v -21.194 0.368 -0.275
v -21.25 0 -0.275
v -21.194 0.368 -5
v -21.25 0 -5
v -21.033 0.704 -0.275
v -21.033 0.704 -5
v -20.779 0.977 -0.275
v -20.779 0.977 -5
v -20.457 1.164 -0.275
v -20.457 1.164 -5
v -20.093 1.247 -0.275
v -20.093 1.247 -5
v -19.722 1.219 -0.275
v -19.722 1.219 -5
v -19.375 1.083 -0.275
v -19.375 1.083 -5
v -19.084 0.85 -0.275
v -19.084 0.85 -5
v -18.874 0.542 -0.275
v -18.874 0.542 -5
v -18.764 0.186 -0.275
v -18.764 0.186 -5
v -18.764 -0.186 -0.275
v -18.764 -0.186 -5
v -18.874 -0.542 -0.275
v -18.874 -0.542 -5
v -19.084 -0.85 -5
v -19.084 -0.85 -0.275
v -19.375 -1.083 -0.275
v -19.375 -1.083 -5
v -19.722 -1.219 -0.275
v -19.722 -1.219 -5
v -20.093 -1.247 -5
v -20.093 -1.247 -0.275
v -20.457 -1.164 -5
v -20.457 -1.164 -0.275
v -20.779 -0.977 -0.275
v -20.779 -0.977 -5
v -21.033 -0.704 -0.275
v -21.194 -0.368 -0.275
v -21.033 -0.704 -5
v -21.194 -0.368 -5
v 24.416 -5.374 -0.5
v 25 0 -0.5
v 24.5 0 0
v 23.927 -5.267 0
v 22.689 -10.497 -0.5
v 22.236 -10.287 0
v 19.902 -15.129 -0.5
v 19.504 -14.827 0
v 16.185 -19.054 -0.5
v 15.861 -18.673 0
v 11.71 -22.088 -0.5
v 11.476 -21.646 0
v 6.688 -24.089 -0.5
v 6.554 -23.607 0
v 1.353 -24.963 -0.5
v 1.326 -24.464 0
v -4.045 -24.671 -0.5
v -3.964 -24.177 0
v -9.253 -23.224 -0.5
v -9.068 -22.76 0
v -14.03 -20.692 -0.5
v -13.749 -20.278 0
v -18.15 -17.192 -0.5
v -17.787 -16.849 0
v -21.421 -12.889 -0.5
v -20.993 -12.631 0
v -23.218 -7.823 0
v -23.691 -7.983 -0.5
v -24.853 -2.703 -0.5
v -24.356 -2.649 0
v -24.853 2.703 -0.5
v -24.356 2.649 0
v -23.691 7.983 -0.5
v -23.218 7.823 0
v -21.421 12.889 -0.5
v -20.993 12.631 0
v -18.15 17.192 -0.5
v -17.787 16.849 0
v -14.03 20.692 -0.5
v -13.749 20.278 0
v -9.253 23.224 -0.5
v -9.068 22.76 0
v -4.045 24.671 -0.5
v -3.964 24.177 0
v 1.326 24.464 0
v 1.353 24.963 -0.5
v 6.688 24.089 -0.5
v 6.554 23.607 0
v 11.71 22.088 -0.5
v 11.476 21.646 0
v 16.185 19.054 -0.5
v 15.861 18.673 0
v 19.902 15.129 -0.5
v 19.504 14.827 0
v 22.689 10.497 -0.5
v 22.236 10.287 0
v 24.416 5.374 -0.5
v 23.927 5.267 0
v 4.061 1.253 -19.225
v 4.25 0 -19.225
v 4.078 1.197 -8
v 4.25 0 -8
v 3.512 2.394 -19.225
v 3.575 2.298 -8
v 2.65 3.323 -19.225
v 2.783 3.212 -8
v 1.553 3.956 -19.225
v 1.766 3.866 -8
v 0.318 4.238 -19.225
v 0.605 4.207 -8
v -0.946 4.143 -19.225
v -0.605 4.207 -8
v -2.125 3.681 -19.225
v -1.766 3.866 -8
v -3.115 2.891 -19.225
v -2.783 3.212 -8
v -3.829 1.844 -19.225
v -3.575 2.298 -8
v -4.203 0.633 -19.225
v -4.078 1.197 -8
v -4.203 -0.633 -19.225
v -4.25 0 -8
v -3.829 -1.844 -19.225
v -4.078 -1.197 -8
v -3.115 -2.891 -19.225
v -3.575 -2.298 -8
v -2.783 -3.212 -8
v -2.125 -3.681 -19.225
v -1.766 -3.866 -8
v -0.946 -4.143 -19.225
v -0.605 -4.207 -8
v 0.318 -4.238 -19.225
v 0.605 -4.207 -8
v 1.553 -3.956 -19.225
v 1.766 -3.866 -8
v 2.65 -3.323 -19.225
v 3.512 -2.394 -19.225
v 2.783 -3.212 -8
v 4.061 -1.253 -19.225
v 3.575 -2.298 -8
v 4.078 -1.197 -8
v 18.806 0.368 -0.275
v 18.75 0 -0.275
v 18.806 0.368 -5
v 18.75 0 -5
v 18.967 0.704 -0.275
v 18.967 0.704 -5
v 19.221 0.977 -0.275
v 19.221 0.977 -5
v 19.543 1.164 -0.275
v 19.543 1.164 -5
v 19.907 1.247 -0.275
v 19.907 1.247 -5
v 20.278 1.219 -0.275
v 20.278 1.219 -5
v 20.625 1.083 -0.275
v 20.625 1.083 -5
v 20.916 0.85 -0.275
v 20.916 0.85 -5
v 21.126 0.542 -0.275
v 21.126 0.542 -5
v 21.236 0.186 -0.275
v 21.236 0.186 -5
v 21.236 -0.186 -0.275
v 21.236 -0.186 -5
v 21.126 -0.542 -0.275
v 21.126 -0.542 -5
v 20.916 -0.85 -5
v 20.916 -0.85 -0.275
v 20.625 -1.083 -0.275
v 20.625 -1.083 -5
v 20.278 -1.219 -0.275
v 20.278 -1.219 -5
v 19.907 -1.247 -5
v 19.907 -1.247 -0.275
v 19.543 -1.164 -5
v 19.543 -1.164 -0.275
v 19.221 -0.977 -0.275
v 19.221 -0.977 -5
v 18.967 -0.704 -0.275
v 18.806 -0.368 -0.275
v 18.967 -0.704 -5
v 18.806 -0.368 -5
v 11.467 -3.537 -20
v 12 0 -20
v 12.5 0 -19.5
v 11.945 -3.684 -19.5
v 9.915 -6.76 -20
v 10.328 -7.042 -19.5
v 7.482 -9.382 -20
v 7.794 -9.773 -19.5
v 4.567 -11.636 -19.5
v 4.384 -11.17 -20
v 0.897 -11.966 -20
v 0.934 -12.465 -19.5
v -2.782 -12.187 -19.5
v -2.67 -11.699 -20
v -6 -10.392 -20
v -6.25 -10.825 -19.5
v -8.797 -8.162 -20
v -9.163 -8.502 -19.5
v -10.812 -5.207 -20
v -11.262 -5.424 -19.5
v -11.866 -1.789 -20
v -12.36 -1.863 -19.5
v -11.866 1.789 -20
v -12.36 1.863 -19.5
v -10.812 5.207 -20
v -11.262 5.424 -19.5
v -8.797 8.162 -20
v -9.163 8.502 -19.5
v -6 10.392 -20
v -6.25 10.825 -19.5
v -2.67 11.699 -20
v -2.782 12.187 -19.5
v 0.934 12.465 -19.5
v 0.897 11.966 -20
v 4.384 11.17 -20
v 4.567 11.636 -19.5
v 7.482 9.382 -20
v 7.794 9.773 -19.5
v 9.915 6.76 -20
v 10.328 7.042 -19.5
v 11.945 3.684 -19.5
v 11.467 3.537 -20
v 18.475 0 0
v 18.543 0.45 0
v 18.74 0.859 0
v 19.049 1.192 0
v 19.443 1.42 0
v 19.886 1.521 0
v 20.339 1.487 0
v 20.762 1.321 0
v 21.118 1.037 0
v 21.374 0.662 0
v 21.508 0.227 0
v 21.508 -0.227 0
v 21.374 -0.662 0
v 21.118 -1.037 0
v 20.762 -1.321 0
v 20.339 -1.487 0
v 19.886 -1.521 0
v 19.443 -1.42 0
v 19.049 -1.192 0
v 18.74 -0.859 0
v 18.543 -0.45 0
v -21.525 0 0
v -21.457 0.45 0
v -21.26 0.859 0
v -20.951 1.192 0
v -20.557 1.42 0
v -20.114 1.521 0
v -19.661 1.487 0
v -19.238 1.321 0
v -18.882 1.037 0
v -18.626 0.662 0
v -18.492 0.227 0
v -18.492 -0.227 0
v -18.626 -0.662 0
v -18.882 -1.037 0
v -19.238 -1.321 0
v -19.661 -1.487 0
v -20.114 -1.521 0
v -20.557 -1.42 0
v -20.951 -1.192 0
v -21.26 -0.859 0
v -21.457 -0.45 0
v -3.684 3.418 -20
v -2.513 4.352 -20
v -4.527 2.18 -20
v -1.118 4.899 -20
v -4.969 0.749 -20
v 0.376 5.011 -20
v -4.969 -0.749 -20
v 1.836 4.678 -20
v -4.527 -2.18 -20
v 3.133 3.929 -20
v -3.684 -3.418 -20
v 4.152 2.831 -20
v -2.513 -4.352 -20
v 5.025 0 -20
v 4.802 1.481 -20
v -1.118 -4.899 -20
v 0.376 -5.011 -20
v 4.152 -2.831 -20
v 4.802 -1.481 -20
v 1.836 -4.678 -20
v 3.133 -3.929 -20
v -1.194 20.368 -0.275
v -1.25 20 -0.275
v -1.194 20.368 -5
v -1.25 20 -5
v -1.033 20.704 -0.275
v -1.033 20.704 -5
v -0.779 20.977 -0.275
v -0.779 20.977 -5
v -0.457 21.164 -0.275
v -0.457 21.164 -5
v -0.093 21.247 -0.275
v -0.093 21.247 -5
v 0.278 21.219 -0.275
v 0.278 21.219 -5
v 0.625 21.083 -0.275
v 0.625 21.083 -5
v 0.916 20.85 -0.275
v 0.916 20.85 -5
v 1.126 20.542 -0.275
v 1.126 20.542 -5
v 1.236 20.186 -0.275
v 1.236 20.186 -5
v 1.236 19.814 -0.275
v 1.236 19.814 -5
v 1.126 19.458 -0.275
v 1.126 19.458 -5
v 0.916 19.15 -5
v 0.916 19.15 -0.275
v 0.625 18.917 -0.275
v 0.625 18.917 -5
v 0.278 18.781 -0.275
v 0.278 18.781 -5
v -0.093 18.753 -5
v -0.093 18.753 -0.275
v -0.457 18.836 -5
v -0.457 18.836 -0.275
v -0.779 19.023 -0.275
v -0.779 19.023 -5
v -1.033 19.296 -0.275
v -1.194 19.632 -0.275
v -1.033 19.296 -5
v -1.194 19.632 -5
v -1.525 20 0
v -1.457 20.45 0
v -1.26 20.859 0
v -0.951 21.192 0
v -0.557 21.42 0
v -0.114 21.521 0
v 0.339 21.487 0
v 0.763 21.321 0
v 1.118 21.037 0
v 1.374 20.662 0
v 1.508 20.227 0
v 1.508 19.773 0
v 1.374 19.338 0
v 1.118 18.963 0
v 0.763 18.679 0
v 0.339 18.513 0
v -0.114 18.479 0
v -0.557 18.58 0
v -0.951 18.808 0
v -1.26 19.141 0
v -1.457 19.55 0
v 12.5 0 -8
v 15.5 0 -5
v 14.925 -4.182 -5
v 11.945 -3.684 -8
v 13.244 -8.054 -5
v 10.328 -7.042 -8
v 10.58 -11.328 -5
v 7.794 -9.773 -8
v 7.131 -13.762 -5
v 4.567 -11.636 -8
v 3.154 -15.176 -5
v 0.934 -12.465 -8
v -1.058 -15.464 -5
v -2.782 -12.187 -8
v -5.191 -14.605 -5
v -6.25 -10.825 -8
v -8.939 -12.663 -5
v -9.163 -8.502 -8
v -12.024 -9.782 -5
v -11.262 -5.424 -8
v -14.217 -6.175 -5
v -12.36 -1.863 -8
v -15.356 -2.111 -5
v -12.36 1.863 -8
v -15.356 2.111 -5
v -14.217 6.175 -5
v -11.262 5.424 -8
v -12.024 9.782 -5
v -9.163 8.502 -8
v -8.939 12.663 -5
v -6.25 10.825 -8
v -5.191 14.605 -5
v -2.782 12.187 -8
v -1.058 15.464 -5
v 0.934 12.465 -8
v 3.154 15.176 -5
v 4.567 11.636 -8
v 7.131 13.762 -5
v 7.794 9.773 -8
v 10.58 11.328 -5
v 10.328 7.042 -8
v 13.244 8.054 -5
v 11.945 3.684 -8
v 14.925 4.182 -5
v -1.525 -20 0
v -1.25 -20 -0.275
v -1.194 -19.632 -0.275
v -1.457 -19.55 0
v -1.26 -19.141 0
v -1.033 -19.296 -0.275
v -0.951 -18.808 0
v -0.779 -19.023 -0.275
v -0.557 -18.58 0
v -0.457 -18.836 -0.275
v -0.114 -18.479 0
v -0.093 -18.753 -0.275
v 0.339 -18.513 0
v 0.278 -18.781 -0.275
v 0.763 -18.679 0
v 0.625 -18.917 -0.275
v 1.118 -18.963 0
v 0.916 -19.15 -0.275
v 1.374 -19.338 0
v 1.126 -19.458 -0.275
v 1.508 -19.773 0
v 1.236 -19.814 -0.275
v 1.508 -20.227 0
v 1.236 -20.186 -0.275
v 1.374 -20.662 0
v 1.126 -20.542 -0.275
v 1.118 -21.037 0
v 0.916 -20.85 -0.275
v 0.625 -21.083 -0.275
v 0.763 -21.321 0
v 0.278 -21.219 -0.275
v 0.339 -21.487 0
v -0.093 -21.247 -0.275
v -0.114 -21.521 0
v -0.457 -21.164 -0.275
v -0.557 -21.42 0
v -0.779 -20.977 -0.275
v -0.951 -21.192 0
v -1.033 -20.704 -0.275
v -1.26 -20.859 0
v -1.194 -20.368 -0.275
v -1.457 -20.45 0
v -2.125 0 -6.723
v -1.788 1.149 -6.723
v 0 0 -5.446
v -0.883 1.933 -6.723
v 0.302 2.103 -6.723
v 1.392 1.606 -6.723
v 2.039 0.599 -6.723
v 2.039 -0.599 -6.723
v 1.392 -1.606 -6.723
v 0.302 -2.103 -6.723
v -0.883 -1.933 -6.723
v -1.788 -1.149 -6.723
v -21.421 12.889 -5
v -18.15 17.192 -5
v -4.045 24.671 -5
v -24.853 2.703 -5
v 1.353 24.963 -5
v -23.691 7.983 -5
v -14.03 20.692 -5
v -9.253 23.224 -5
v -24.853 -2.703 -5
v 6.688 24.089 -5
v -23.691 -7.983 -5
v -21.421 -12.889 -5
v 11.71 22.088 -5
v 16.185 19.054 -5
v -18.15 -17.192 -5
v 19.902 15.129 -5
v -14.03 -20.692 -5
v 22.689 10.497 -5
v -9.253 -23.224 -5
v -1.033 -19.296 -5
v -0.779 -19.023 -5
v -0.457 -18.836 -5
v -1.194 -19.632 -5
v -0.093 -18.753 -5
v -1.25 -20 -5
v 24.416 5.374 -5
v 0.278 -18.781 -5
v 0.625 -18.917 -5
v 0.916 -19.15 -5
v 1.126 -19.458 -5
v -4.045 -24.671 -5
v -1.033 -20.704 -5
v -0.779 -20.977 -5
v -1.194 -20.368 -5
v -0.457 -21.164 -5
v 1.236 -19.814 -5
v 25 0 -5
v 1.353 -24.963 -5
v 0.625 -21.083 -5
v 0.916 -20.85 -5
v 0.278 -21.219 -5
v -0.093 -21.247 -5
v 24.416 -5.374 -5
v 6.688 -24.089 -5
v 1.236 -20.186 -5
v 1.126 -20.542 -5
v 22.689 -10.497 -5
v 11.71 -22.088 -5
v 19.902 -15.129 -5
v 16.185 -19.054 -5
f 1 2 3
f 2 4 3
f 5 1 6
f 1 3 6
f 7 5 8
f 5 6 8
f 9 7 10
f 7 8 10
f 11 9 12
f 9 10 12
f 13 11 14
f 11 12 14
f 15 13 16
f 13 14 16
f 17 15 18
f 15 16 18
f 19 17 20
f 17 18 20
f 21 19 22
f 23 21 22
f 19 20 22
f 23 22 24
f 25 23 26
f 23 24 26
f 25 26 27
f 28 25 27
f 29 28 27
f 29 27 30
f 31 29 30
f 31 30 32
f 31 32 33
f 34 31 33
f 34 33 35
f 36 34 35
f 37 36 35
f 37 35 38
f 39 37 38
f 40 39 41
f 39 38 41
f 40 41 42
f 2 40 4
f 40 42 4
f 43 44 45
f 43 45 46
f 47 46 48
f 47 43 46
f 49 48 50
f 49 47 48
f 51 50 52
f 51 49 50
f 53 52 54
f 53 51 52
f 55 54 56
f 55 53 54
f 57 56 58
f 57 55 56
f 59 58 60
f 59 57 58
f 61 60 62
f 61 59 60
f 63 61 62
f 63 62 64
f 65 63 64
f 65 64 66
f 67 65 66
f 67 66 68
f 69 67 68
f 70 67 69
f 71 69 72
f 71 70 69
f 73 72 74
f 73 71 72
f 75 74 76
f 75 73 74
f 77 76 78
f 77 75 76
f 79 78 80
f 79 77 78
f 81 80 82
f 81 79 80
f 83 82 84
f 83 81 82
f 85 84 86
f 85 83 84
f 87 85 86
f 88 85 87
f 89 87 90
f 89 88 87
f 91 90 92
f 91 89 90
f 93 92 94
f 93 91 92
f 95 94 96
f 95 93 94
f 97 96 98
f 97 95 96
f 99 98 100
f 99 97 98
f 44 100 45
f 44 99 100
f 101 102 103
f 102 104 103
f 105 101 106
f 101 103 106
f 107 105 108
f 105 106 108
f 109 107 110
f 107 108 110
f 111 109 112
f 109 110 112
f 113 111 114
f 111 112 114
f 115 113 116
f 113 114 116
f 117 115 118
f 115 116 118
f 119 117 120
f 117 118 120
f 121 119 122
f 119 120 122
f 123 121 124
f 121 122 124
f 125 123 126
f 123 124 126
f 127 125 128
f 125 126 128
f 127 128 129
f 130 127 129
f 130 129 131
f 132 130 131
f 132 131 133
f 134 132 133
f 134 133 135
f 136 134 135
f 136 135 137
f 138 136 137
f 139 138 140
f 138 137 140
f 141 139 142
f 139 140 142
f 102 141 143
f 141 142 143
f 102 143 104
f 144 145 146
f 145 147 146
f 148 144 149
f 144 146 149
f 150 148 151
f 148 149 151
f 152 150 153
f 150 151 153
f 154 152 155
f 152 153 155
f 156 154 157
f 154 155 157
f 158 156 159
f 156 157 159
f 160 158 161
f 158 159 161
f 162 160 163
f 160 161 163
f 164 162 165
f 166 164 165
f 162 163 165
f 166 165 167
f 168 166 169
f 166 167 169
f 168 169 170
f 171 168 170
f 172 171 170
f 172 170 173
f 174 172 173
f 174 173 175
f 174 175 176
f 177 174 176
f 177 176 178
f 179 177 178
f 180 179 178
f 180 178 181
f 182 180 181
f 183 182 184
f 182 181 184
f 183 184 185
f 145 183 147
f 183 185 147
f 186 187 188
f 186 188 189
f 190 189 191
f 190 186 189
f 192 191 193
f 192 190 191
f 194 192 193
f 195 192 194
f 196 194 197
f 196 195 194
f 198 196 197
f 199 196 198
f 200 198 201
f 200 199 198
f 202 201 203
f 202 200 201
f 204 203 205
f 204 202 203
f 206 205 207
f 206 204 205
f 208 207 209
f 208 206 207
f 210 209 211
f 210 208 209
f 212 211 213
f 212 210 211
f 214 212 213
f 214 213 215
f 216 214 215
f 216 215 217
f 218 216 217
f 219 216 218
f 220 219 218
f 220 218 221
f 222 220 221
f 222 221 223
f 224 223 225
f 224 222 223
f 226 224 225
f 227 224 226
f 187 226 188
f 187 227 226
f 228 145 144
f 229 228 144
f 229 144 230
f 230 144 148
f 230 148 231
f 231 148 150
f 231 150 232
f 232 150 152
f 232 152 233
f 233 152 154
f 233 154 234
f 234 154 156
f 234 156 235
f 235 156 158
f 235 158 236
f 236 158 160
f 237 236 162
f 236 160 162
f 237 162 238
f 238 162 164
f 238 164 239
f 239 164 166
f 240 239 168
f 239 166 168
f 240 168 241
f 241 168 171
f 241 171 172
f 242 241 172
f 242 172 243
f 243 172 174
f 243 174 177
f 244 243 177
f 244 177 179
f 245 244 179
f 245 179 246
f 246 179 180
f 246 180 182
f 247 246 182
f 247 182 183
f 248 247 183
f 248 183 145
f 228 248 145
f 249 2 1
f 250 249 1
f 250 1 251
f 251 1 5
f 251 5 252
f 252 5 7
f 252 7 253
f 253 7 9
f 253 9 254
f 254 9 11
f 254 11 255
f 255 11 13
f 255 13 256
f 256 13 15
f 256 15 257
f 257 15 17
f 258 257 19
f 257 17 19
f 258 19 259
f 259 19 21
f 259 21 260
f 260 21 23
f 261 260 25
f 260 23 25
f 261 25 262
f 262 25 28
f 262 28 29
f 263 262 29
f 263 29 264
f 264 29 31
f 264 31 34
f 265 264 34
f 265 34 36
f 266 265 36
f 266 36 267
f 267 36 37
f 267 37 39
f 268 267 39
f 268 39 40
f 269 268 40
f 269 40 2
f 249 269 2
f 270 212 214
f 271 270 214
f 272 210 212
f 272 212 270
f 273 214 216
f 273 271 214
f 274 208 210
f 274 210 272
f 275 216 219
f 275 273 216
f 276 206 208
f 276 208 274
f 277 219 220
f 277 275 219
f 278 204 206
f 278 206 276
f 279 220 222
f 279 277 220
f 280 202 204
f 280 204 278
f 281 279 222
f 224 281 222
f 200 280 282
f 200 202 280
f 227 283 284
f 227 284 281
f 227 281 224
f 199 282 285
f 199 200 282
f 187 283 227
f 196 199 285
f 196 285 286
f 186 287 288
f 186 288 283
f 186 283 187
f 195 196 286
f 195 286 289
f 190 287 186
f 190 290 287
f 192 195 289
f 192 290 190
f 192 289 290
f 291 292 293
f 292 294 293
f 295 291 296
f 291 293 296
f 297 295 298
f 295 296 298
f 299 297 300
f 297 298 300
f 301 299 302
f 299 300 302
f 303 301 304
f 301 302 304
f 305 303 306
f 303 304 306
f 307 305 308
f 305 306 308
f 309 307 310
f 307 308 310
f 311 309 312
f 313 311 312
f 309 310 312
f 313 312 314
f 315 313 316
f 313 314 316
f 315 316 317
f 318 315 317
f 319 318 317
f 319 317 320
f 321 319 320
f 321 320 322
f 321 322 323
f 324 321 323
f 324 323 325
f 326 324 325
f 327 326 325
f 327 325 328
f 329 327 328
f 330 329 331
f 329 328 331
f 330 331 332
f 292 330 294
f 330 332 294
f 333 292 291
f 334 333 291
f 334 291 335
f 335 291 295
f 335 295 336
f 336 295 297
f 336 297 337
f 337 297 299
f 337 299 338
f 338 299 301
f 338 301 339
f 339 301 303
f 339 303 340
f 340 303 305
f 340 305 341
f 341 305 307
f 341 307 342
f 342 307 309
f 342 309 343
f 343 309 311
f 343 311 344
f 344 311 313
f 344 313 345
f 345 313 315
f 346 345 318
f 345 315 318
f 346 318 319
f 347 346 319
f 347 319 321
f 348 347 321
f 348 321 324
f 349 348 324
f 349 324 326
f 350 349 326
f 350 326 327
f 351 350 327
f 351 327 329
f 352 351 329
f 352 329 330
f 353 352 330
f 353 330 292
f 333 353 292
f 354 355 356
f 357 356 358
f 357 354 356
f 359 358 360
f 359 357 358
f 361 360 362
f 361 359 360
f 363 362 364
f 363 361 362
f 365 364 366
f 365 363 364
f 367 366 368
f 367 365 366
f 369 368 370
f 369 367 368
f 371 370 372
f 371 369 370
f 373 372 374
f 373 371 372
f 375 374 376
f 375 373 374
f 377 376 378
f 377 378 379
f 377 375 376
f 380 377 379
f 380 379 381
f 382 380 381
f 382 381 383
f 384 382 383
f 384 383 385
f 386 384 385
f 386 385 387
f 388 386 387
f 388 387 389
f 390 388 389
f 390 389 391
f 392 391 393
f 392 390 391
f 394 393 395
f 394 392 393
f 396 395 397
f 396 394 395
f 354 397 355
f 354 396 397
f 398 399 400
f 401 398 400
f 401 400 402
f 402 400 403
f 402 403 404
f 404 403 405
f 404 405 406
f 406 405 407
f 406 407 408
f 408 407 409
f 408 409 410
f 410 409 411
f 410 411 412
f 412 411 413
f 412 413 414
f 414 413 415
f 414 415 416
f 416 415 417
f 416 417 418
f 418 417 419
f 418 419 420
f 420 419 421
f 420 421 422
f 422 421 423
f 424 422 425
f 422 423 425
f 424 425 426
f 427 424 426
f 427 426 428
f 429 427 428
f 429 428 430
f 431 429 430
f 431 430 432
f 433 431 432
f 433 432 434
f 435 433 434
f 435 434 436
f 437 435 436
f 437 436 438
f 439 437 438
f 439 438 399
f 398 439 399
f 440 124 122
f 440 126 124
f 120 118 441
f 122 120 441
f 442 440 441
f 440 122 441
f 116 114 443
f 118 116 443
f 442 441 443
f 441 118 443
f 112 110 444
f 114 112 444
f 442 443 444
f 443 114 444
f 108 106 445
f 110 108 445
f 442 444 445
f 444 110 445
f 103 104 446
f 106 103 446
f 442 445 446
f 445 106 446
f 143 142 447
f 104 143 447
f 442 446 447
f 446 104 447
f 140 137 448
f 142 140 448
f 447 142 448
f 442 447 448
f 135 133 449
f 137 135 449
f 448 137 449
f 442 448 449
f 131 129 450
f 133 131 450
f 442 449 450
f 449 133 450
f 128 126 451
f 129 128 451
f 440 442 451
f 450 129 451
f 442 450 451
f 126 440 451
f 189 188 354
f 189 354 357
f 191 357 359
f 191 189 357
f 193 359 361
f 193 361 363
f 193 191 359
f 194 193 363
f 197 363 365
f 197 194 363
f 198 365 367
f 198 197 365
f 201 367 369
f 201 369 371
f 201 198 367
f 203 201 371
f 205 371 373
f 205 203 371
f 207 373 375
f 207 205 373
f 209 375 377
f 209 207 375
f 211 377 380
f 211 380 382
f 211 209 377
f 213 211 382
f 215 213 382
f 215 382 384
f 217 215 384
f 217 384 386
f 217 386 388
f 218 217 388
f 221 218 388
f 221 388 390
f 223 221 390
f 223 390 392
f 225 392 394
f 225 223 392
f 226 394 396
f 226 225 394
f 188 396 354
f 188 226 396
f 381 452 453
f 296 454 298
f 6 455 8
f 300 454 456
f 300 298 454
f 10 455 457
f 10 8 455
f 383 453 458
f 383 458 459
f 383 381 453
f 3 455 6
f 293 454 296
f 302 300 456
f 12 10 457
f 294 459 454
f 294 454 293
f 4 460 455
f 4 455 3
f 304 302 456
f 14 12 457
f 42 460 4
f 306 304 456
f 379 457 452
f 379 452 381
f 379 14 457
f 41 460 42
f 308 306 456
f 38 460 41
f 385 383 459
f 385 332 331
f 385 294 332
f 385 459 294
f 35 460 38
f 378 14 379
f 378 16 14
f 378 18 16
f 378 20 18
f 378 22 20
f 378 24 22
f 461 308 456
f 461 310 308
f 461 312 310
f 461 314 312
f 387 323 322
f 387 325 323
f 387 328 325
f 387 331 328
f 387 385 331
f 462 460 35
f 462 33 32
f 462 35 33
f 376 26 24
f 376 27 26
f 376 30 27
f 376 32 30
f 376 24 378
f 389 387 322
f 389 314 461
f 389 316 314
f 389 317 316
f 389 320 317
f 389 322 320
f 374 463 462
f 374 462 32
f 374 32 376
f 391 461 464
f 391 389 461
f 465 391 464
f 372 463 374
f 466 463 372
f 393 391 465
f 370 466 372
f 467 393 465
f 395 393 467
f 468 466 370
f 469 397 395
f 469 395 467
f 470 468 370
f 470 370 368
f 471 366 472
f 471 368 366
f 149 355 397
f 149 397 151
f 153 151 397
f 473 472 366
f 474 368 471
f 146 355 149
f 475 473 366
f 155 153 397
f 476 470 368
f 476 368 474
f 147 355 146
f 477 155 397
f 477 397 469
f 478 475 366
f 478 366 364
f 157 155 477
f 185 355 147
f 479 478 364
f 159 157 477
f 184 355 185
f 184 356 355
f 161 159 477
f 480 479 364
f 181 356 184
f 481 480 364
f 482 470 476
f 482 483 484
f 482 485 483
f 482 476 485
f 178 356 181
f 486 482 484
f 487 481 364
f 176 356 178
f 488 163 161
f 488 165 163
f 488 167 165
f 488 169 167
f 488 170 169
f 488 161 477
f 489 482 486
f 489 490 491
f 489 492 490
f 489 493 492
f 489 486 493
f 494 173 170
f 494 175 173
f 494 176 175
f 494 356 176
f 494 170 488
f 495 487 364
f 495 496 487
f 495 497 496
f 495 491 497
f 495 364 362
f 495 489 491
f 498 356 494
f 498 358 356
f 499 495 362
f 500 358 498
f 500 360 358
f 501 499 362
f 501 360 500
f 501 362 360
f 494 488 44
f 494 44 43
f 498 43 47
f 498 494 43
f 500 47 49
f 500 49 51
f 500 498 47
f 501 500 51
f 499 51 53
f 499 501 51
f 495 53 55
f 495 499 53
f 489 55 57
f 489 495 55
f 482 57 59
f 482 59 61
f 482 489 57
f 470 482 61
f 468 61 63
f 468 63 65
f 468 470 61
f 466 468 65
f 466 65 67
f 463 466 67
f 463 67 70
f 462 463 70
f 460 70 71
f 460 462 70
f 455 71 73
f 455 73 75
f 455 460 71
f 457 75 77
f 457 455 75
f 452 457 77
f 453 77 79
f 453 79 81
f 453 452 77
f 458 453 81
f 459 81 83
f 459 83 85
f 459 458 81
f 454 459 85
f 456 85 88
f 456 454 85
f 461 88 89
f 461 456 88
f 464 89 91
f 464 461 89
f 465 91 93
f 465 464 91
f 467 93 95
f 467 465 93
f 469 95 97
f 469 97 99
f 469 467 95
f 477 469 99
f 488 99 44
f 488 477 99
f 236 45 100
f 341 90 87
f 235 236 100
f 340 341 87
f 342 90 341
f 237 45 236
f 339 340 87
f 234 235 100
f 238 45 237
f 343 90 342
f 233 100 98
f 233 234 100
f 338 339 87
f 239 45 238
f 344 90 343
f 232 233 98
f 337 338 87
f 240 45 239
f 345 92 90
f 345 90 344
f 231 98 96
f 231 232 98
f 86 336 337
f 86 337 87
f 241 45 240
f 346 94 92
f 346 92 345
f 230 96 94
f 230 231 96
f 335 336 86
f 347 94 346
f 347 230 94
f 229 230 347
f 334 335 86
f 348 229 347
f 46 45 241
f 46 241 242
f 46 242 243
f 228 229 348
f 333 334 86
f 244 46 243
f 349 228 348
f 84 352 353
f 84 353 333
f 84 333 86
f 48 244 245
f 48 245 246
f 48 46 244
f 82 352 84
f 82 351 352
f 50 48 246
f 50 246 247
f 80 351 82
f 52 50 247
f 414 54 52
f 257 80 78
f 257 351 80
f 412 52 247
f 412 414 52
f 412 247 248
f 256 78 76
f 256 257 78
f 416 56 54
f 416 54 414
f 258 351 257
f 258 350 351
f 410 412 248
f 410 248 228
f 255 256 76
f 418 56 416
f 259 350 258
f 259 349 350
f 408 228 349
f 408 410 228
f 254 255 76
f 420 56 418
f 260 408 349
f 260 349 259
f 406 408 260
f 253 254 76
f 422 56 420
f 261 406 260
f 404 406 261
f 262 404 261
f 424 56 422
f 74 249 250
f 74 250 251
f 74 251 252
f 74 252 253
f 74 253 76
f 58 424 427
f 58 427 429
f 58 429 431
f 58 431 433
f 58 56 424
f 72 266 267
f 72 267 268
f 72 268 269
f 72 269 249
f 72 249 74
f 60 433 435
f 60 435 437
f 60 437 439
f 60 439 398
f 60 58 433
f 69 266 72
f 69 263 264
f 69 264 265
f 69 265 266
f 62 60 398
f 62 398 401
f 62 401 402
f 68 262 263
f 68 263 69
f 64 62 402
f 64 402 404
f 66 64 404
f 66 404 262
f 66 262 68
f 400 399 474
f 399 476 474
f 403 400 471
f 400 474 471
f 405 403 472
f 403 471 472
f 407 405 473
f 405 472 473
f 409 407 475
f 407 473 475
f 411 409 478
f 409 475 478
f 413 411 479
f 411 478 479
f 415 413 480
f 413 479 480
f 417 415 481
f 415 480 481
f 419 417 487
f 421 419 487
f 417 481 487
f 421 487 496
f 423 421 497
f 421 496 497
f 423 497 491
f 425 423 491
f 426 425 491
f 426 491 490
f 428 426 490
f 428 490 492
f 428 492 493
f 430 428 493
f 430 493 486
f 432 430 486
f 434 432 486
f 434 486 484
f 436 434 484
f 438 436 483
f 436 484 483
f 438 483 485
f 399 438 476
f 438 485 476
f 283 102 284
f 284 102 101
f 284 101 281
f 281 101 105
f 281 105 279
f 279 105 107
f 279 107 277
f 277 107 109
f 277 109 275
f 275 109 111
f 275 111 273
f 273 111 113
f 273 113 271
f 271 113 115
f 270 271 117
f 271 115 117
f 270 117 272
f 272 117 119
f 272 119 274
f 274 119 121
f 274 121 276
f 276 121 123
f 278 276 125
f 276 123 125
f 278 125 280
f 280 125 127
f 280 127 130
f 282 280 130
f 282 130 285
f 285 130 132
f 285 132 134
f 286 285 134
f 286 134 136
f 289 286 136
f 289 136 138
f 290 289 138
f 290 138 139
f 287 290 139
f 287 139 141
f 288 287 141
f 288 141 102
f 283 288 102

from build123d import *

# Parameters (mm, degrees)
HOLE_WIZARD_M10_1_D           = 8.5
HOLE_WIZARD_M10_1_DEPTH       = 12
HOLE_WIZARD_M10_1_CSINK_D     = 10.05
HOLE_WIZARD_M10_1_CSINK_ANGLE = 90
HOLE_WIZARD_M10_1_TIP         = 2.553657631
CHAMFER_1_SIZE                = 3
HOLE_WIZARD_M3_1_D            = 2.5
HOLE_WIZARD_M3_1_DEPTH        = 7.5
HOLE_WIZARD_M3_1_CSINK_D      = 3.05
HOLE_WIZARD_M3_1_CSINK_ANGLE  = 90
HOLE_WIZARD_M3_1_TIP          = 0.751075774
CHAMFER_2_SIZE                = 0.5


with BuildPart() as part:
    # 草图1 → 旋转1 (revolve)
    with BuildSketch(Plane(origin=(0, 0, 0), x_dir=(0, 0, -1), z_dir=(1, 0, 0)), mode=Mode.PRIVATE) as revolve_1_sk:
        Polygon((0, 0), (0, 25), (5, 25), (5, 12.5), (20, 12.5), (20, 0), align=None)
    revolve(revolve_1_sk.sketch.rotate(Axis((0, 0, 109.85915493), (0, 0, -1)), 90), axis=Axis((0, 0, 109.85915493), (0, 0, -1)))

    # M10 螺纹孔1
    with Locations(Plane(origin=(0, 0, -20), x_dir=(-1, 0, 0), z_dir=(0, 0, -1))):
        with Locations((0, 0)):
            CounterSinkHole(HOLE_WIZARD_M10_1_D / 2, HOLE_WIZARD_M10_1_CSINK_D / 2, depth=HOLE_WIZARD_M10_1_DEPTH, counter_sink_angle=HOLE_WIZARD_M10_1_CSINK_ANGLE)
            with Locations((0, 0, -(HOLE_WIZARD_M10_1_DEPTH + HOLE_WIZARD_M10_1_TIP / 2))):  # 118° drill point
                Cone(0, HOLE_WIZARD_M10_1_D / 2, HOLE_WIZARD_M10_1_TIP, mode=Mode.SUBTRACT)

    # 倒角1
    chamfer_1_edges = [part.edges().sort_by_distance(p)[0] for p in [
        (-12.5, 0, -5),
    ]]
    chamfer(chamfer_1_edges, length=CHAMFER_1_SIZE)

    # M3 螺纹孔1
    with Locations(Plane.XY):
        with Locations((-20, 0), (0, 20), (20, 0), (0, -20)):
            CounterSinkHole(HOLE_WIZARD_M3_1_D / 2, HOLE_WIZARD_M3_1_CSINK_D / 2, depth=HOLE_WIZARD_M3_1_DEPTH, counter_sink_angle=HOLE_WIZARD_M3_1_CSINK_ANGLE)
            with Locations((0, 0, -(HOLE_WIZARD_M3_1_DEPTH + HOLE_WIZARD_M3_1_TIP / 2))):  # 118° drill point
                Cone(0, HOLE_WIZARD_M3_1_D / 2, HOLE_WIZARD_M3_1_TIP, mode=Mode.SUBTRACT)

    # 倒角2
    chamfer_2_edges = [part.edges().sort_by_distance(p)[0] for p in [
        (-12.5, 0, -20),
        (-25, 0, 0),
    ]]
    chamfer(chamfer_2_edges, length=CHAMFER_2_SIZE)


solid = part.part
